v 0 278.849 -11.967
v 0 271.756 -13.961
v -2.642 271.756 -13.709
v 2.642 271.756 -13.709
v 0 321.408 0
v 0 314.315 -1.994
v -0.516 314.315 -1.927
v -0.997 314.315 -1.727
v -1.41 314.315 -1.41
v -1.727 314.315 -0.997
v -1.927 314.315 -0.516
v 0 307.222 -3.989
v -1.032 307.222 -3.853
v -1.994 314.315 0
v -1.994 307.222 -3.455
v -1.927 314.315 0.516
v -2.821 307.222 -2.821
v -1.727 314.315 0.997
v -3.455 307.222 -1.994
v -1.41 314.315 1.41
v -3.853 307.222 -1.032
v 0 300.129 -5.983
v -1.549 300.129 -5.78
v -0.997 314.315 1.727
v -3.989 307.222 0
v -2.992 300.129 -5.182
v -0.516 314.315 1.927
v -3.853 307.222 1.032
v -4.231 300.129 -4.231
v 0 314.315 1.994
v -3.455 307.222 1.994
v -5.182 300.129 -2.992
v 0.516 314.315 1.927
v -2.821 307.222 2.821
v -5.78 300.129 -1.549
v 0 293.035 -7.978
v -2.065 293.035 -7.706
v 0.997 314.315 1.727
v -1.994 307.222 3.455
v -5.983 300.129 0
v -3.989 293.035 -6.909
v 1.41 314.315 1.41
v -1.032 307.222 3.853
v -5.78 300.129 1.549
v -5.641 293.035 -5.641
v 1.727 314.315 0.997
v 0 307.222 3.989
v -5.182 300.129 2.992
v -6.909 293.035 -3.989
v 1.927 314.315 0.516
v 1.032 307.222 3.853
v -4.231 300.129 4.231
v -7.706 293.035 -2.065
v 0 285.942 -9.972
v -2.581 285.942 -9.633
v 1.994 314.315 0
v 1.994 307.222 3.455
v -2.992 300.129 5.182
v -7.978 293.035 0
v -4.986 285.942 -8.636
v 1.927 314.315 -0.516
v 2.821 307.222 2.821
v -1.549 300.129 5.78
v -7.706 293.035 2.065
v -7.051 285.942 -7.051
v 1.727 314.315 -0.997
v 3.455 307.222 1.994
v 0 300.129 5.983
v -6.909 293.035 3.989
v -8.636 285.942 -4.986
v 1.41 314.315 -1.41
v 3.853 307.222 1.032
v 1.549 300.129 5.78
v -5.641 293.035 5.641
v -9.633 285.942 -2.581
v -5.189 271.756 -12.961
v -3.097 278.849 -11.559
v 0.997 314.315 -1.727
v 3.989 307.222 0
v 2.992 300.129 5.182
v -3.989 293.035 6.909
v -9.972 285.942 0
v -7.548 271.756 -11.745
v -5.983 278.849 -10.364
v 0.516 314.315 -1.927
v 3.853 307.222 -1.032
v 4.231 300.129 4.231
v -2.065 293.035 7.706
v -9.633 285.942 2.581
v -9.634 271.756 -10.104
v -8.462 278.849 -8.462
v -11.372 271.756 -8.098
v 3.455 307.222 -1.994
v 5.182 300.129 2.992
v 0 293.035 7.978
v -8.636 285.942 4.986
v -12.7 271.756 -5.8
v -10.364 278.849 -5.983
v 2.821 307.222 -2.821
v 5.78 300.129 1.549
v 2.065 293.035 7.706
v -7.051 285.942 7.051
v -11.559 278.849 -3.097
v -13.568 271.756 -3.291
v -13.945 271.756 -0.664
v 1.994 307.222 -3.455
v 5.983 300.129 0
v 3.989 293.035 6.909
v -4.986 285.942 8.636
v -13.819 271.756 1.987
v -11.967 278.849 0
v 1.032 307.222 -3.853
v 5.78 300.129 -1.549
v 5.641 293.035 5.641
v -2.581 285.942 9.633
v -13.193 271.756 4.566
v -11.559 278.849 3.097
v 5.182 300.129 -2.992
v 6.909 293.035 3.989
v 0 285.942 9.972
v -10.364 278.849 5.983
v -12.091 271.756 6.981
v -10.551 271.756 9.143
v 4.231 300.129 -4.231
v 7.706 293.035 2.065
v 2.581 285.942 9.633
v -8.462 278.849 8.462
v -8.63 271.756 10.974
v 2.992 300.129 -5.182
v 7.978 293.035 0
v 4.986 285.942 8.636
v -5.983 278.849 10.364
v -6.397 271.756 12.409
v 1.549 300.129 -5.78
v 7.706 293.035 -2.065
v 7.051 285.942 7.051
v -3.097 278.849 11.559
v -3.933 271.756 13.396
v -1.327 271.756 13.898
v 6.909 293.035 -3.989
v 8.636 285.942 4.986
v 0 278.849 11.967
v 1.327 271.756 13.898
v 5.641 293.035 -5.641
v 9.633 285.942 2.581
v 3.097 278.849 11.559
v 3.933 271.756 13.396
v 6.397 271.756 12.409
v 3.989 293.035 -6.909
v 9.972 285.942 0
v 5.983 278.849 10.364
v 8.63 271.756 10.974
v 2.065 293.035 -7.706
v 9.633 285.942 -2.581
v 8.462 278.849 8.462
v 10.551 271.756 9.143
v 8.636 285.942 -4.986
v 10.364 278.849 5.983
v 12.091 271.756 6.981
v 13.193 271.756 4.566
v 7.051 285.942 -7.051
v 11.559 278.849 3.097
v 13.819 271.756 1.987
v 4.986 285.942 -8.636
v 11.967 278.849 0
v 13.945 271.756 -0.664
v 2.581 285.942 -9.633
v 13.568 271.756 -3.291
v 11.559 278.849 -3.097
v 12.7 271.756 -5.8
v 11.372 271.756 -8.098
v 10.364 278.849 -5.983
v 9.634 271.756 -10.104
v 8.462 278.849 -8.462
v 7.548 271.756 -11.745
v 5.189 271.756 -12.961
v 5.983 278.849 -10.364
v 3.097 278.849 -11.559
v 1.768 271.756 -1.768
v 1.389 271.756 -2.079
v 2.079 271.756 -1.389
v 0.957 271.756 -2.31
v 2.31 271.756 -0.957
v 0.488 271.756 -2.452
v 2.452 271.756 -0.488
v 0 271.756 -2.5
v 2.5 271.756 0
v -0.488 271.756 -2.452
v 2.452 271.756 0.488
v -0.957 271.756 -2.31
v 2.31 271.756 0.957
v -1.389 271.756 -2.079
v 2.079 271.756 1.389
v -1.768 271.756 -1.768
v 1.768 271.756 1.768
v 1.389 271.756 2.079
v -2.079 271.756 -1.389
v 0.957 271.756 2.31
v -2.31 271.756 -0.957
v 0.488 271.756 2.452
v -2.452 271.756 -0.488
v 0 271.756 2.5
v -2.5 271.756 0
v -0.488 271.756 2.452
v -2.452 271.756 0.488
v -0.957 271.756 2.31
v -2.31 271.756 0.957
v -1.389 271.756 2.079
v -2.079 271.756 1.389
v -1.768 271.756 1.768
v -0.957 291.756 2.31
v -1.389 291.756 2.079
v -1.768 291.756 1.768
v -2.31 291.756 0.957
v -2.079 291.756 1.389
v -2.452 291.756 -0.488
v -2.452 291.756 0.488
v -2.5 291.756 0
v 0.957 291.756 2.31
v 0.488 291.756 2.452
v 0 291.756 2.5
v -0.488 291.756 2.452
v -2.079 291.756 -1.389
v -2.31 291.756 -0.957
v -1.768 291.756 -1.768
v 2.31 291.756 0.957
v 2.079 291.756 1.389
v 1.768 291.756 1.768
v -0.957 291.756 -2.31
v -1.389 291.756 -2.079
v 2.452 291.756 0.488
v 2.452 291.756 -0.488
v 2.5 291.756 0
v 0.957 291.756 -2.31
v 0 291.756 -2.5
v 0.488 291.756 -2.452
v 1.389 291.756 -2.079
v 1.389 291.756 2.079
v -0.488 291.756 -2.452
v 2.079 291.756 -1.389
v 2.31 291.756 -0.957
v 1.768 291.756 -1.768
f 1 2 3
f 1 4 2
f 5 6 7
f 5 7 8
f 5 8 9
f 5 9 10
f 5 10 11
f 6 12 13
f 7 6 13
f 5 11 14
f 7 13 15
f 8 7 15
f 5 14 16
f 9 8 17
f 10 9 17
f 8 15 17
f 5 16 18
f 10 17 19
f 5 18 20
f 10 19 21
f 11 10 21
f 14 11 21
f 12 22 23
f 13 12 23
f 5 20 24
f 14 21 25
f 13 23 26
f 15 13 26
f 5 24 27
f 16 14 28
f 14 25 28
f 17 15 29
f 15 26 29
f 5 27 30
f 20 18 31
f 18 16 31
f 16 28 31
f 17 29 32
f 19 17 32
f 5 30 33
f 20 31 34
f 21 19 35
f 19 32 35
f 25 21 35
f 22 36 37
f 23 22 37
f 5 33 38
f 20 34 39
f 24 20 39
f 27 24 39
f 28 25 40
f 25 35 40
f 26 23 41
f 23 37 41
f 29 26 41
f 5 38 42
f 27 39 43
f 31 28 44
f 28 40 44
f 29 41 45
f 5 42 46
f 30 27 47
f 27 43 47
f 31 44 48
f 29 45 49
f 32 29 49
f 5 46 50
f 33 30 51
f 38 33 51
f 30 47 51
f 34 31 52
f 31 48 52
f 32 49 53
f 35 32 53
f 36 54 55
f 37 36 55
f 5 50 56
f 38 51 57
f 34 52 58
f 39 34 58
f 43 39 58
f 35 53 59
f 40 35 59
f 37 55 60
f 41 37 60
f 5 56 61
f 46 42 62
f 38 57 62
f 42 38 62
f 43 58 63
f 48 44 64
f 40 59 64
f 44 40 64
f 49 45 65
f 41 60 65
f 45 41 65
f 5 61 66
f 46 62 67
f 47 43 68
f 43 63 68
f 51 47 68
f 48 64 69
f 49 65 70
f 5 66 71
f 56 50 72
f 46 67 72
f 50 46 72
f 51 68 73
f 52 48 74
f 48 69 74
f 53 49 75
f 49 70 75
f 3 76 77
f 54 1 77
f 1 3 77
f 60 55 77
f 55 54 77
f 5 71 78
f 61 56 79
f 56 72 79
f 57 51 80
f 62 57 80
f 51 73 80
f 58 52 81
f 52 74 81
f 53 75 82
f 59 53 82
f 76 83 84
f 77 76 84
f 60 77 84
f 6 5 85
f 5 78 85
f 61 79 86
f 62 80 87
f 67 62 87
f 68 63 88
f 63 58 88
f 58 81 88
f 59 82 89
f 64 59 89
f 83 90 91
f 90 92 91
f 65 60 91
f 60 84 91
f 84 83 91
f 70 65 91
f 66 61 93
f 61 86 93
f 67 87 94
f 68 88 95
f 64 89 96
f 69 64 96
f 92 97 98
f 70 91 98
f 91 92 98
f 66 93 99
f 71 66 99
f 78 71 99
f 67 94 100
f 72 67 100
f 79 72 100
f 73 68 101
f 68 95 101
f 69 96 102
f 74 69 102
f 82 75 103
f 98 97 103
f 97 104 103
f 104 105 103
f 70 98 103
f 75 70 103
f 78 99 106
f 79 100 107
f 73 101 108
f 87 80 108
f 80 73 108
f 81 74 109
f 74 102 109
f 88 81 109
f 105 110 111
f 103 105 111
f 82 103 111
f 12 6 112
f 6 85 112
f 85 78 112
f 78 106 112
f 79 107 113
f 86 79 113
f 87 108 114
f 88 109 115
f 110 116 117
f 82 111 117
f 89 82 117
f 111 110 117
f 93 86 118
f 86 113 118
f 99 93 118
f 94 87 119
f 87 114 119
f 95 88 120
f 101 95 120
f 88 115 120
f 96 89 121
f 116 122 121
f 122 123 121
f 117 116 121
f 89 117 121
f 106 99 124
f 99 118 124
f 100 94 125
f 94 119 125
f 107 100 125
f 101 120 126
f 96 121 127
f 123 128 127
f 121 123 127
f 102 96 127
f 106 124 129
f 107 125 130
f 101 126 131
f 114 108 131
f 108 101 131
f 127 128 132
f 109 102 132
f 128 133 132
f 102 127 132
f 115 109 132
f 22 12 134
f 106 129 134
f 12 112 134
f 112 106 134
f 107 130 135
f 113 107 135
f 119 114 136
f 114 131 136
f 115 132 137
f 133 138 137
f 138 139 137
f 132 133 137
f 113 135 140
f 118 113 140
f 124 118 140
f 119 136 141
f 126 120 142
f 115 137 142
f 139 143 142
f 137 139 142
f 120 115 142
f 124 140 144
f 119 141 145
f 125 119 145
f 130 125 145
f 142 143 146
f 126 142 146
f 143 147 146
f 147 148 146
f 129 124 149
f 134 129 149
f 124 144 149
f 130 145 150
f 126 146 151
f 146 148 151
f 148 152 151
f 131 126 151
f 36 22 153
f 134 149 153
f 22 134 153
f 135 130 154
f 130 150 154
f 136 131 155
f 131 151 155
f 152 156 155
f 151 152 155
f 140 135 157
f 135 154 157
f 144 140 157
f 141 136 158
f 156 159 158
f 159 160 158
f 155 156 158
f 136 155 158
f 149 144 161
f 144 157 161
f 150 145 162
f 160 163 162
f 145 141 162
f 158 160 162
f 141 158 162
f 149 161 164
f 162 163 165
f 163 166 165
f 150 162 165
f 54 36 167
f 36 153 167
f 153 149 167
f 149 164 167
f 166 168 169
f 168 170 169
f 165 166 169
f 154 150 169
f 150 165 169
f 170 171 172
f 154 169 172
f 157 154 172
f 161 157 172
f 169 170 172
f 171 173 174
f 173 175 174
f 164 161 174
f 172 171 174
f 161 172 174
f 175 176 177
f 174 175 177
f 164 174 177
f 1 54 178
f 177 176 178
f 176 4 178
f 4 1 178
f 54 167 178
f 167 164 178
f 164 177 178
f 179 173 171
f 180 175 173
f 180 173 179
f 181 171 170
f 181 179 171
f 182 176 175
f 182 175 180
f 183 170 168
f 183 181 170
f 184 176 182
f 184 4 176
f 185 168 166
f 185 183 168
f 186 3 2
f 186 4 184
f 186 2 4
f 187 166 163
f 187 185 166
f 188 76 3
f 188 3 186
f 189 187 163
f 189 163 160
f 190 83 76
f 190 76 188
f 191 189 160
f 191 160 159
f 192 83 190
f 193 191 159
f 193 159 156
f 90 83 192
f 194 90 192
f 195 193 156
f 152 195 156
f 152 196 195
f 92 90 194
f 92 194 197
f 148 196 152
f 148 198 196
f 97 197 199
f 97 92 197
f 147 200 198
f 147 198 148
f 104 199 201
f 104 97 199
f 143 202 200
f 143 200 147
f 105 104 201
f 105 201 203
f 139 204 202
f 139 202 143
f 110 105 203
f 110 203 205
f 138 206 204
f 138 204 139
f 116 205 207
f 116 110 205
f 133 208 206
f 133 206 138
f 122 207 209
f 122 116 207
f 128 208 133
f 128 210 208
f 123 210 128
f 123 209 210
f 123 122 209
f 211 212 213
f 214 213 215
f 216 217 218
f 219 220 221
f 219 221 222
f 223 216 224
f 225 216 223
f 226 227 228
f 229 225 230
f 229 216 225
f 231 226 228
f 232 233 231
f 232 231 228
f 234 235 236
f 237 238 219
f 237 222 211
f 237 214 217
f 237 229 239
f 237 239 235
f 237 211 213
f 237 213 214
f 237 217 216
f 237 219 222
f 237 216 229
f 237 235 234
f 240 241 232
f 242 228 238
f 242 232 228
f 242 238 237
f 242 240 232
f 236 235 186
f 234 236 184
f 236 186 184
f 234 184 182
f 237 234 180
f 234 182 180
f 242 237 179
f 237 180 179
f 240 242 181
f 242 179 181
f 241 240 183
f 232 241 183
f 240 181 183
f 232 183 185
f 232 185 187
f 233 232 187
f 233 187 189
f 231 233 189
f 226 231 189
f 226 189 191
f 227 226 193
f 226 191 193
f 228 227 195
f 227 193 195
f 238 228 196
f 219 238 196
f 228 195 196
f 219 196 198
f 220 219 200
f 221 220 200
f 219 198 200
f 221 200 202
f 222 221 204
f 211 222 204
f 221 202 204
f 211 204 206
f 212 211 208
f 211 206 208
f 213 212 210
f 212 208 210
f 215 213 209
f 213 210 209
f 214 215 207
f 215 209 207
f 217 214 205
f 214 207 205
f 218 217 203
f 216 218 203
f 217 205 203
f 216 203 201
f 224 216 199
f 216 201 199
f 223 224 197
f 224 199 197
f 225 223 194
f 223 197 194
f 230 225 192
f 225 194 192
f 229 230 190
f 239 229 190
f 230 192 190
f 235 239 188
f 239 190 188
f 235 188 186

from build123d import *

# Parameters (mm, degrees)
SKETCH2_R          = 2.5
CUT_EXTRUDE1_DEPTH = 20


with BuildPart() as part:
    # Sketch1 → Revolve1 (revolve)
    with BuildSketch(Plane.XY, mode=Mode.PRIVATE) as revolve1_sk:
        Polygon((0, 325.102863253), (0, 271.755588021), (15, 271.755588021), align=None)
    revolve(revolve1_sk.sketch.rotate(Axis((0, 0, 0), (0, 1, 0)), 90), axis=Axis((0, 0, 0), (0, 1, 0)))

    # Sketch2 → Cut-Extrude1 (cut)
    with BuildSketch(Plane.XZ.offset(-271.755588021)):
        with Locations(Location((0, 0, 0), (0, 0, 270))):
            Circle(SKETCH2_R)
    extrude(amount=-CUT_EXTRUDE1_DEPTH, mode=Mode.SUBTRACT)

    # Sketch4 → Cut-Revolve1 (revolve, cut)
    with BuildSketch(Plane.XY, mode=Mode.PRIVATE) as cut_revolve1_sk:
        Polygon((15, 271.755588021), (0, 325.102863253), (0, 321.408464024), (13.961221764, 271.755588021), align=None)
    revolve(cut_revolve1_sk.sketch.rotate(Axis((0, 271.755588021, 0), (0, 1, 0)), 90), axis=Axis((0, 271.755588021, 0), (0, 1, 0)), mode=Mode.SUBTRACT)


solid = part.part
